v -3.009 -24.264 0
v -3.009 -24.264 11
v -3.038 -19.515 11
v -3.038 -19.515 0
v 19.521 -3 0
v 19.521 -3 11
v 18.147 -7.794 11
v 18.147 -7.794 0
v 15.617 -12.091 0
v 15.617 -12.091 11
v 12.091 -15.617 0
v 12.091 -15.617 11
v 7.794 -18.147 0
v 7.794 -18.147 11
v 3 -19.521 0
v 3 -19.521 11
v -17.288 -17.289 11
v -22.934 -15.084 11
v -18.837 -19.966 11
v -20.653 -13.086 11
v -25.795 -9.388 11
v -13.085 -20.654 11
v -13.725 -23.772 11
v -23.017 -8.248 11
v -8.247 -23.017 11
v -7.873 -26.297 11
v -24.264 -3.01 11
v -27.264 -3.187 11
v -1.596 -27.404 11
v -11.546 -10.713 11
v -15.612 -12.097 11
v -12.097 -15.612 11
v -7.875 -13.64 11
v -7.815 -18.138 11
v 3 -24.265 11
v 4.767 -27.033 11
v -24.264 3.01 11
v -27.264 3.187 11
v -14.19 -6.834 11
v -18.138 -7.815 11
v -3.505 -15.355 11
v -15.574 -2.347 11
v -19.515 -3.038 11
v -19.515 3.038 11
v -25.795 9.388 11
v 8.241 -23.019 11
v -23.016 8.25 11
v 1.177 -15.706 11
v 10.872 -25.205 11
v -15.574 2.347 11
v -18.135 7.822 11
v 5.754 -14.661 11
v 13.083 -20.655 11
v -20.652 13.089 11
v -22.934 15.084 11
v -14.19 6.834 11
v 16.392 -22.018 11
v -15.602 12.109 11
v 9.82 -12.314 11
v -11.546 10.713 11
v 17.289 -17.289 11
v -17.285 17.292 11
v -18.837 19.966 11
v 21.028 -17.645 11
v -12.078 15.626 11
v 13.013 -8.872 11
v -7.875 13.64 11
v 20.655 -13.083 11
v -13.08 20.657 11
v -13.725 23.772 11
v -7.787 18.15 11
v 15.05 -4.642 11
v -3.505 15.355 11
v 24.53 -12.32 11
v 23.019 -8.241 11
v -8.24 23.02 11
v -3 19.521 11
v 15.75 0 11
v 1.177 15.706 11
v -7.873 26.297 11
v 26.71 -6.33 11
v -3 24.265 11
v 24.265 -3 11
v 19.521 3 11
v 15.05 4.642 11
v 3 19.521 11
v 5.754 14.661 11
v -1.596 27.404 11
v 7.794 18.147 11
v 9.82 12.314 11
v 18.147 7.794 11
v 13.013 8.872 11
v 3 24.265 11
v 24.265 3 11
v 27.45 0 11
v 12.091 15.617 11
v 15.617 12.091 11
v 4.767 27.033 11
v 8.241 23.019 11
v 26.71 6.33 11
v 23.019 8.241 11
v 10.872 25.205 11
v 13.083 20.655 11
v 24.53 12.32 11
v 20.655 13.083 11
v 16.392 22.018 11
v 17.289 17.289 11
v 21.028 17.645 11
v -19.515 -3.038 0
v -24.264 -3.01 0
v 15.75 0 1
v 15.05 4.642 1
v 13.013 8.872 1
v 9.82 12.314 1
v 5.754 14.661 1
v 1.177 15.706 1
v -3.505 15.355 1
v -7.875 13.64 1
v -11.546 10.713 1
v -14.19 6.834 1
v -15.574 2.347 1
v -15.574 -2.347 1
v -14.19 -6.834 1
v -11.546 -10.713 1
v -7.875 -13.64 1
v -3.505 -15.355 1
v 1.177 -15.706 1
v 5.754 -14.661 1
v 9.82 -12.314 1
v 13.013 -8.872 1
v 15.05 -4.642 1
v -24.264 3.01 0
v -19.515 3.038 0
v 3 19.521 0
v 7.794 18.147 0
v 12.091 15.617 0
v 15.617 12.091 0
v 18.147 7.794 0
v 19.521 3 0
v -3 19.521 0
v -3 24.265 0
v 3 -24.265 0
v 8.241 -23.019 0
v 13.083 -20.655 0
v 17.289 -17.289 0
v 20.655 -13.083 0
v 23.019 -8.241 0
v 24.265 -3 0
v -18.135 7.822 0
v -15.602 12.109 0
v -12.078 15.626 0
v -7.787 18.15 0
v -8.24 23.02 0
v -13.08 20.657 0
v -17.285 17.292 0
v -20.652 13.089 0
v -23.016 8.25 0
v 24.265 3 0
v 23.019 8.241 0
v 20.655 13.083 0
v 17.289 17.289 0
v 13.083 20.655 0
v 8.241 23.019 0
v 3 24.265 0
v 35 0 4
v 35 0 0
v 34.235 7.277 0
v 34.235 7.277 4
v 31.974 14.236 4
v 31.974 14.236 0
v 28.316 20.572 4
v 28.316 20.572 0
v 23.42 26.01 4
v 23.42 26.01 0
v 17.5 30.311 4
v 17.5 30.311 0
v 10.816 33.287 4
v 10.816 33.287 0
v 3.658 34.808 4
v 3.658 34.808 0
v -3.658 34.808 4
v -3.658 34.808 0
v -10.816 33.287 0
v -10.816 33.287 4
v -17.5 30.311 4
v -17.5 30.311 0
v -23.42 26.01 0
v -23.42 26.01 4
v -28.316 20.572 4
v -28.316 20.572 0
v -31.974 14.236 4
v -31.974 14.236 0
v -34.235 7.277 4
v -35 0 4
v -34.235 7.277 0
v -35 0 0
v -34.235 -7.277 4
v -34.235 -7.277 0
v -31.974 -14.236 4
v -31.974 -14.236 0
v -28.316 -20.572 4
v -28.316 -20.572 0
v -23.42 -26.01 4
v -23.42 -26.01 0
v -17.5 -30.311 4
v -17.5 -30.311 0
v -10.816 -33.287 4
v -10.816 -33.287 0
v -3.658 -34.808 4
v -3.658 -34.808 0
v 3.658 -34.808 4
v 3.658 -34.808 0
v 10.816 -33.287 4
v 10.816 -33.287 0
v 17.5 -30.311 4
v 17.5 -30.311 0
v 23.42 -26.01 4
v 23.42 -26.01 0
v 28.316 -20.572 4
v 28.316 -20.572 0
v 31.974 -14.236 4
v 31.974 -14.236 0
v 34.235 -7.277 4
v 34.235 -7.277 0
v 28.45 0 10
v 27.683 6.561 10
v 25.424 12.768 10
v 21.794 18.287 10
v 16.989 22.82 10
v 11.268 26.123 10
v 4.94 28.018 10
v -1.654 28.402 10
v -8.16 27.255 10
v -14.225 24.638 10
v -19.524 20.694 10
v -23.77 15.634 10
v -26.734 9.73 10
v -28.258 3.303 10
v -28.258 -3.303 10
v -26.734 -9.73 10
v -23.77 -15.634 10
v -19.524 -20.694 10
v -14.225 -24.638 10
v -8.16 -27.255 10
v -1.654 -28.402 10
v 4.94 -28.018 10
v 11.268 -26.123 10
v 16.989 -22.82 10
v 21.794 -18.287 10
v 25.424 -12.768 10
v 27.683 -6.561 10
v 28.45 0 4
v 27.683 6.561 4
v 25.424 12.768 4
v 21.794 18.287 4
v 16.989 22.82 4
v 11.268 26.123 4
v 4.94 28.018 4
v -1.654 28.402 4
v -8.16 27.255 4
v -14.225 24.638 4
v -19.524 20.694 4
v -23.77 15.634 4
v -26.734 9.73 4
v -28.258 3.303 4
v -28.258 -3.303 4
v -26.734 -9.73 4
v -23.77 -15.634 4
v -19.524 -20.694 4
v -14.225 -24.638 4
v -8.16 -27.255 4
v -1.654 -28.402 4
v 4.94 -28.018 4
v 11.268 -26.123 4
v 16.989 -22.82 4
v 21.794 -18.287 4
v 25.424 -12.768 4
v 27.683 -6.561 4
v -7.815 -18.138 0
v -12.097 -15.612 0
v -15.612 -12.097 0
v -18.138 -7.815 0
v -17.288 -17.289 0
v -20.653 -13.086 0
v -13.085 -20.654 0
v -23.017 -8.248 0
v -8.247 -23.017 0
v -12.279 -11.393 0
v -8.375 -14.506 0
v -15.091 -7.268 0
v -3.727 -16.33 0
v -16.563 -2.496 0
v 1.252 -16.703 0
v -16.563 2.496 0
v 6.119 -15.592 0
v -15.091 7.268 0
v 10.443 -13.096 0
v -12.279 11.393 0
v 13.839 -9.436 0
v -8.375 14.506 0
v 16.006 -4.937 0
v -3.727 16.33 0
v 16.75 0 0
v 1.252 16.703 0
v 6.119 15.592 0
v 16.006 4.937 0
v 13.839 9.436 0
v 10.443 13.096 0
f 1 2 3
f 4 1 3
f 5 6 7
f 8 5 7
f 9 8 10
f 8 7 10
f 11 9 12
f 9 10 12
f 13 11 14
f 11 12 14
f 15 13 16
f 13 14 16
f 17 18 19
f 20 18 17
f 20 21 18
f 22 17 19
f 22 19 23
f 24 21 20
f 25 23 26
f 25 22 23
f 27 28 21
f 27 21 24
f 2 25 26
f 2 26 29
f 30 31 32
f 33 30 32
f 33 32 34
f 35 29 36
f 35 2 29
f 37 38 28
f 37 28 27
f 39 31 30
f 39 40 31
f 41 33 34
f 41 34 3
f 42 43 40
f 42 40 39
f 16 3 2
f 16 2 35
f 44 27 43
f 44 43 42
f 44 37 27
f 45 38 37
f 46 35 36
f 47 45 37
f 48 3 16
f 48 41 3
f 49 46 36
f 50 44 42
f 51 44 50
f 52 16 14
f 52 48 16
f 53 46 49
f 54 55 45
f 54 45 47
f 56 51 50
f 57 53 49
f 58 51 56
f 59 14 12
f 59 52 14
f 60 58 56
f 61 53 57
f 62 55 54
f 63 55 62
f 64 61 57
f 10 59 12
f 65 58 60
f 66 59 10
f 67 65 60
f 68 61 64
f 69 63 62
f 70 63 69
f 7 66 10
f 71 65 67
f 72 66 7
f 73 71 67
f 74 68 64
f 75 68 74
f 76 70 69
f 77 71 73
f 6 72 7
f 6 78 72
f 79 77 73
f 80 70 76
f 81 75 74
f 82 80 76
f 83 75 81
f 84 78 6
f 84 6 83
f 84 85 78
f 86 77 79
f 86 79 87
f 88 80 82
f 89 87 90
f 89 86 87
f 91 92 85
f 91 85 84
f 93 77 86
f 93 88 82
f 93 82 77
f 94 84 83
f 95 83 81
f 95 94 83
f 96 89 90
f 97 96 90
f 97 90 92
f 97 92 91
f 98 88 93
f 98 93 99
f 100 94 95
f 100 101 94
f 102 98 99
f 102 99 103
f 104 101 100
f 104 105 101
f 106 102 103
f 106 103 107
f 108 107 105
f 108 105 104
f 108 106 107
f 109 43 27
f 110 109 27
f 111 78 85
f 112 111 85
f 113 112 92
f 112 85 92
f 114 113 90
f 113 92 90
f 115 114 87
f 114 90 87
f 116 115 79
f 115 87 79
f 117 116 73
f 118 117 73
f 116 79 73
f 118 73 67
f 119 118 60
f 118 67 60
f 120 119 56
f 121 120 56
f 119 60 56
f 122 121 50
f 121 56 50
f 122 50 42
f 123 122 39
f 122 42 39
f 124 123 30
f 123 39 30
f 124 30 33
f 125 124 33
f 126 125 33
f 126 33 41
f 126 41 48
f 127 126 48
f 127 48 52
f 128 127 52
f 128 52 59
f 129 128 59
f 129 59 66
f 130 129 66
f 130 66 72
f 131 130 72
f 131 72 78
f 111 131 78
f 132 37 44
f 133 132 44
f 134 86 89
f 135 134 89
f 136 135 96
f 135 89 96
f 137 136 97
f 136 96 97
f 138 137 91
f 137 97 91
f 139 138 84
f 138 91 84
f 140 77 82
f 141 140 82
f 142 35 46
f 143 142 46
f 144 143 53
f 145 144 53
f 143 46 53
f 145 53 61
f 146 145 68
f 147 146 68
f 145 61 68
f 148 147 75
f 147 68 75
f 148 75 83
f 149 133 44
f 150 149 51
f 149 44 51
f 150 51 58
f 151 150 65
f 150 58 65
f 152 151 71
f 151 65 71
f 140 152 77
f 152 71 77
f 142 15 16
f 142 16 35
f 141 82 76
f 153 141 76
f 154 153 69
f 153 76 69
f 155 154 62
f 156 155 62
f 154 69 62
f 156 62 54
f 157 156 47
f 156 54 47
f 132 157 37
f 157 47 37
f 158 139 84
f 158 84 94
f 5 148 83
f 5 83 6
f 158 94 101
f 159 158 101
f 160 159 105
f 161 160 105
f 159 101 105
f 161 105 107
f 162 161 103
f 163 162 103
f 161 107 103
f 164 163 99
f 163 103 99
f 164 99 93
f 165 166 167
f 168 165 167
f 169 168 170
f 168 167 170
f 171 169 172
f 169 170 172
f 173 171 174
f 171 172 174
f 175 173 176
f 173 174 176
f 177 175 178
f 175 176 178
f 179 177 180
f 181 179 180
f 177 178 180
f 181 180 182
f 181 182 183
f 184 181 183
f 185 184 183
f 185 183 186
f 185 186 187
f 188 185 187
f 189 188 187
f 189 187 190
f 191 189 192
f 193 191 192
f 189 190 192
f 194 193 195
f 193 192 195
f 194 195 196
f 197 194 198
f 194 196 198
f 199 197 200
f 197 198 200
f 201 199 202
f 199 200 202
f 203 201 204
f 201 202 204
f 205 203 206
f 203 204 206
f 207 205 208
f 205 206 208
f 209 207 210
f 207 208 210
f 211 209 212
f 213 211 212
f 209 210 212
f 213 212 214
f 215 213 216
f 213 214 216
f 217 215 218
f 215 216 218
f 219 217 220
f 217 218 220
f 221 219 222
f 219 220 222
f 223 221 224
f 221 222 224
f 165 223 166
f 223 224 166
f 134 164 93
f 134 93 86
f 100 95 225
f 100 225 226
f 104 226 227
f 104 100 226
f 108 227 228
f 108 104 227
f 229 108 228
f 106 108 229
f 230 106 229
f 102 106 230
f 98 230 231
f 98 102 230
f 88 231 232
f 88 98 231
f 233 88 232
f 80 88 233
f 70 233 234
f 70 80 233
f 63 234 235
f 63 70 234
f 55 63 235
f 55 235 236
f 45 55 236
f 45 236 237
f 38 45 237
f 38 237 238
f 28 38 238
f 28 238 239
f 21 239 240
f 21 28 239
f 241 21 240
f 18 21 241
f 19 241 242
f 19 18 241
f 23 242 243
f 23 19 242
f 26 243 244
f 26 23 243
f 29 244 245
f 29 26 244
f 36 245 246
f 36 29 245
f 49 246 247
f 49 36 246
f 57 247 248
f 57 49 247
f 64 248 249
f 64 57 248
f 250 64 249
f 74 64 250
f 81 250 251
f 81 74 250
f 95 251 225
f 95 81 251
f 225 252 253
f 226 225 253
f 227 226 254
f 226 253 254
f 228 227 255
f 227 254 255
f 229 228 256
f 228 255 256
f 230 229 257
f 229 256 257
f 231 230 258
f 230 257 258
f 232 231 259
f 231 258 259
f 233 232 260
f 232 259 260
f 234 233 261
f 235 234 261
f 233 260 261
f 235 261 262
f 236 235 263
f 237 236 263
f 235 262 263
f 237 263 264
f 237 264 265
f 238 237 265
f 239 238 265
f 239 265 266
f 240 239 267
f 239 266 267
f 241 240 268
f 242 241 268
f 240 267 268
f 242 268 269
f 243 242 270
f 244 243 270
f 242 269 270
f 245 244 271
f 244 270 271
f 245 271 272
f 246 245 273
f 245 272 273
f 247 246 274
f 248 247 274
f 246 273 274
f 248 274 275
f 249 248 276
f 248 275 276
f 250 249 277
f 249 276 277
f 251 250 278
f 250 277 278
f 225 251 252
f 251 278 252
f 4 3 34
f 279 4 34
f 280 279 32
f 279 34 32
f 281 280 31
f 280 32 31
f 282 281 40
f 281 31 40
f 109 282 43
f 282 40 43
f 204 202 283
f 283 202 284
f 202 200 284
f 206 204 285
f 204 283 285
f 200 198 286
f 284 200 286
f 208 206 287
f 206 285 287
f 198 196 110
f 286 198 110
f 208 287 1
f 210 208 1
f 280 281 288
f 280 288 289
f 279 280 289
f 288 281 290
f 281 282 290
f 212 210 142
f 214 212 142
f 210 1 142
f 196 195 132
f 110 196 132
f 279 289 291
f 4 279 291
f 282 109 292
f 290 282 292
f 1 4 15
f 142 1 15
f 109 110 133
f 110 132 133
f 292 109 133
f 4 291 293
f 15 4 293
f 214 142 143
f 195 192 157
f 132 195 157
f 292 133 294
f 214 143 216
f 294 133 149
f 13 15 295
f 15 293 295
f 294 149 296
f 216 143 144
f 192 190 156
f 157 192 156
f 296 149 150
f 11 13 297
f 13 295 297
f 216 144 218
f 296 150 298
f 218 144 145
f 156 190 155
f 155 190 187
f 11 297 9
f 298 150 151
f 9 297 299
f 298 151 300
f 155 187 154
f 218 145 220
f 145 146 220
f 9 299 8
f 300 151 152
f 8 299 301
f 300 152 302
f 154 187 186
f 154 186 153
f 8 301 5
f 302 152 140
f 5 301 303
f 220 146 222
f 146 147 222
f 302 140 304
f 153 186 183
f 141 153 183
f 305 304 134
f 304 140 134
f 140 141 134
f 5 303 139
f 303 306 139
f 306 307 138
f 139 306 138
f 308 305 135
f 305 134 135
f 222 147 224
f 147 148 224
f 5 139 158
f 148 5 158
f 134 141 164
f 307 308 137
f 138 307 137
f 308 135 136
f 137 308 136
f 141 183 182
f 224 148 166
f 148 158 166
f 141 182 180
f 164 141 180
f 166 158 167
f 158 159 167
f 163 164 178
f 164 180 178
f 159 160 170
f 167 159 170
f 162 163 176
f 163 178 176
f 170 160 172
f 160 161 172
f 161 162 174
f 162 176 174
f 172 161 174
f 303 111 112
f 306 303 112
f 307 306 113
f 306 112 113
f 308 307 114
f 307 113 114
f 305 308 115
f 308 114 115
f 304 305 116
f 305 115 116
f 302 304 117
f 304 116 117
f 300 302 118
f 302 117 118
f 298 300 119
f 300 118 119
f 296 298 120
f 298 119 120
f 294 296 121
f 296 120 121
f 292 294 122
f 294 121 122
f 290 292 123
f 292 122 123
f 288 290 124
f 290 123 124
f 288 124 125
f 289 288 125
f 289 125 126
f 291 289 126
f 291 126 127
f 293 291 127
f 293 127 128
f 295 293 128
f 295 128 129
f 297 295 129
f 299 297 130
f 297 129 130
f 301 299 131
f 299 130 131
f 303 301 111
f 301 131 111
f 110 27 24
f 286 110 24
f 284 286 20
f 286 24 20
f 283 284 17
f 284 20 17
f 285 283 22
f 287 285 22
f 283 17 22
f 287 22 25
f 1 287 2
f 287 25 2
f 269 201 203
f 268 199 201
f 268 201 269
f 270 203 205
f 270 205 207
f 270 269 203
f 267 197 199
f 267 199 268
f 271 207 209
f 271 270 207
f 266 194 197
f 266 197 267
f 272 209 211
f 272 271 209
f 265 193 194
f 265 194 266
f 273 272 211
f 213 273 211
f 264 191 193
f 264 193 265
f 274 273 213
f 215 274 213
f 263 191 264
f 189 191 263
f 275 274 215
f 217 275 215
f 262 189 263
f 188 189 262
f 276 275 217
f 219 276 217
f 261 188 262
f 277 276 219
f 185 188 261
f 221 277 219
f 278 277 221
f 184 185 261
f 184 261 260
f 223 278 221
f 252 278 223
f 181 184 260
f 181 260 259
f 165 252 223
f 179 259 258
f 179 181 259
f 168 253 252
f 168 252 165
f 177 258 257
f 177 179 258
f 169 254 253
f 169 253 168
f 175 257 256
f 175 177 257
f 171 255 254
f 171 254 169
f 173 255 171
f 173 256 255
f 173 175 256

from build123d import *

# Parameters (mm, degrees)
F0_R     = 35
F1_DEPTH = 4
F2_R     = 28.45
F3_DEPTH = 7
F4_R     = 15.75
F5_DEPTH = 11.001
F6_SIZE  = 1


with BuildPart() as f1:
    # F0 (on Top) → F1 (new body)
    with BuildSketch(Plane.XY):
        Circle(F0_R)
    extrude(amount=F1_DEPTH)

    # F2 (on face) → F3 (join)
    with BuildSketch(Plane.XY.offset(4)):
        Circle(F2_R)
    extrude(amount=F3_DEPTH)

    # F4 (on face) → F5 (cut, through all)
    with BuildSketch(Plane.XY.offset(11)):
        with BuildLine():
            Line((19.520822, 3), (24.265253, 3))
            ThreePointArc((24.265253, 3), (17.288761, 17.288761), (3, 24.265253))
            Line((3, 24.265253), (3, 19.520822))
            ThreePointArc((3, 19.520822), (13.965359, 13.965359), (19.520822, 3))
        make_face()
        with BuildLine():
            ThreePointArc((3, -24.265253), (17.288761, -17.288761), (24.265253, -3))
            Line((24.265253, -3), (19.520822, -3))
            ThreePointArc((19.520822, -3), (13.965359, -13.965359), (3, -19.520822))
            Line((3, -19.520822), (3, -24.265253))
        make_face()
        with BuildLine():
            Line((-3, 19.520822), (-3, 24.265253))
            ThreePointArc((-3, 24.265253), (-17.285086, 17.292435), (-24.263976, 3.010314))
            Line((-24.263976, 3.010314), (-19.514873, 3.038462))
            ThreePointArc((-19.514873, 3.038462), (-13.951592, 13.979112), (-3, 19.520822))
        make_face()
        with BuildLine():
            ThreePointArc((-3.038462, -19.514873), (-13.965359, -13.965359), (-19.514873, -3.038462))
            Line((-19.514873, -3.038462), (-24.263976, -3.010314))
            ThreePointArc((-24.263976, -3.010314), (-17.288467, -17.289054), (-3.00949, -24.264078))
            Line((-3.00949, -24.264078), (-3.038462, -19.514873))
        make_face()
        Circle(F4_R)
    extrude(amount=-F5_DEPTH, mode=Mode.SUBTRACT)

    # F6
    f6_edges = [f1.edges().sort_by_distance(p)[0] for p in [
        (-28.45, 0, 11),
        (-15.75, 0, 0),
    ]]
    chamfer(f6_edges, length=F6_SIZE)


solid = f1.part
